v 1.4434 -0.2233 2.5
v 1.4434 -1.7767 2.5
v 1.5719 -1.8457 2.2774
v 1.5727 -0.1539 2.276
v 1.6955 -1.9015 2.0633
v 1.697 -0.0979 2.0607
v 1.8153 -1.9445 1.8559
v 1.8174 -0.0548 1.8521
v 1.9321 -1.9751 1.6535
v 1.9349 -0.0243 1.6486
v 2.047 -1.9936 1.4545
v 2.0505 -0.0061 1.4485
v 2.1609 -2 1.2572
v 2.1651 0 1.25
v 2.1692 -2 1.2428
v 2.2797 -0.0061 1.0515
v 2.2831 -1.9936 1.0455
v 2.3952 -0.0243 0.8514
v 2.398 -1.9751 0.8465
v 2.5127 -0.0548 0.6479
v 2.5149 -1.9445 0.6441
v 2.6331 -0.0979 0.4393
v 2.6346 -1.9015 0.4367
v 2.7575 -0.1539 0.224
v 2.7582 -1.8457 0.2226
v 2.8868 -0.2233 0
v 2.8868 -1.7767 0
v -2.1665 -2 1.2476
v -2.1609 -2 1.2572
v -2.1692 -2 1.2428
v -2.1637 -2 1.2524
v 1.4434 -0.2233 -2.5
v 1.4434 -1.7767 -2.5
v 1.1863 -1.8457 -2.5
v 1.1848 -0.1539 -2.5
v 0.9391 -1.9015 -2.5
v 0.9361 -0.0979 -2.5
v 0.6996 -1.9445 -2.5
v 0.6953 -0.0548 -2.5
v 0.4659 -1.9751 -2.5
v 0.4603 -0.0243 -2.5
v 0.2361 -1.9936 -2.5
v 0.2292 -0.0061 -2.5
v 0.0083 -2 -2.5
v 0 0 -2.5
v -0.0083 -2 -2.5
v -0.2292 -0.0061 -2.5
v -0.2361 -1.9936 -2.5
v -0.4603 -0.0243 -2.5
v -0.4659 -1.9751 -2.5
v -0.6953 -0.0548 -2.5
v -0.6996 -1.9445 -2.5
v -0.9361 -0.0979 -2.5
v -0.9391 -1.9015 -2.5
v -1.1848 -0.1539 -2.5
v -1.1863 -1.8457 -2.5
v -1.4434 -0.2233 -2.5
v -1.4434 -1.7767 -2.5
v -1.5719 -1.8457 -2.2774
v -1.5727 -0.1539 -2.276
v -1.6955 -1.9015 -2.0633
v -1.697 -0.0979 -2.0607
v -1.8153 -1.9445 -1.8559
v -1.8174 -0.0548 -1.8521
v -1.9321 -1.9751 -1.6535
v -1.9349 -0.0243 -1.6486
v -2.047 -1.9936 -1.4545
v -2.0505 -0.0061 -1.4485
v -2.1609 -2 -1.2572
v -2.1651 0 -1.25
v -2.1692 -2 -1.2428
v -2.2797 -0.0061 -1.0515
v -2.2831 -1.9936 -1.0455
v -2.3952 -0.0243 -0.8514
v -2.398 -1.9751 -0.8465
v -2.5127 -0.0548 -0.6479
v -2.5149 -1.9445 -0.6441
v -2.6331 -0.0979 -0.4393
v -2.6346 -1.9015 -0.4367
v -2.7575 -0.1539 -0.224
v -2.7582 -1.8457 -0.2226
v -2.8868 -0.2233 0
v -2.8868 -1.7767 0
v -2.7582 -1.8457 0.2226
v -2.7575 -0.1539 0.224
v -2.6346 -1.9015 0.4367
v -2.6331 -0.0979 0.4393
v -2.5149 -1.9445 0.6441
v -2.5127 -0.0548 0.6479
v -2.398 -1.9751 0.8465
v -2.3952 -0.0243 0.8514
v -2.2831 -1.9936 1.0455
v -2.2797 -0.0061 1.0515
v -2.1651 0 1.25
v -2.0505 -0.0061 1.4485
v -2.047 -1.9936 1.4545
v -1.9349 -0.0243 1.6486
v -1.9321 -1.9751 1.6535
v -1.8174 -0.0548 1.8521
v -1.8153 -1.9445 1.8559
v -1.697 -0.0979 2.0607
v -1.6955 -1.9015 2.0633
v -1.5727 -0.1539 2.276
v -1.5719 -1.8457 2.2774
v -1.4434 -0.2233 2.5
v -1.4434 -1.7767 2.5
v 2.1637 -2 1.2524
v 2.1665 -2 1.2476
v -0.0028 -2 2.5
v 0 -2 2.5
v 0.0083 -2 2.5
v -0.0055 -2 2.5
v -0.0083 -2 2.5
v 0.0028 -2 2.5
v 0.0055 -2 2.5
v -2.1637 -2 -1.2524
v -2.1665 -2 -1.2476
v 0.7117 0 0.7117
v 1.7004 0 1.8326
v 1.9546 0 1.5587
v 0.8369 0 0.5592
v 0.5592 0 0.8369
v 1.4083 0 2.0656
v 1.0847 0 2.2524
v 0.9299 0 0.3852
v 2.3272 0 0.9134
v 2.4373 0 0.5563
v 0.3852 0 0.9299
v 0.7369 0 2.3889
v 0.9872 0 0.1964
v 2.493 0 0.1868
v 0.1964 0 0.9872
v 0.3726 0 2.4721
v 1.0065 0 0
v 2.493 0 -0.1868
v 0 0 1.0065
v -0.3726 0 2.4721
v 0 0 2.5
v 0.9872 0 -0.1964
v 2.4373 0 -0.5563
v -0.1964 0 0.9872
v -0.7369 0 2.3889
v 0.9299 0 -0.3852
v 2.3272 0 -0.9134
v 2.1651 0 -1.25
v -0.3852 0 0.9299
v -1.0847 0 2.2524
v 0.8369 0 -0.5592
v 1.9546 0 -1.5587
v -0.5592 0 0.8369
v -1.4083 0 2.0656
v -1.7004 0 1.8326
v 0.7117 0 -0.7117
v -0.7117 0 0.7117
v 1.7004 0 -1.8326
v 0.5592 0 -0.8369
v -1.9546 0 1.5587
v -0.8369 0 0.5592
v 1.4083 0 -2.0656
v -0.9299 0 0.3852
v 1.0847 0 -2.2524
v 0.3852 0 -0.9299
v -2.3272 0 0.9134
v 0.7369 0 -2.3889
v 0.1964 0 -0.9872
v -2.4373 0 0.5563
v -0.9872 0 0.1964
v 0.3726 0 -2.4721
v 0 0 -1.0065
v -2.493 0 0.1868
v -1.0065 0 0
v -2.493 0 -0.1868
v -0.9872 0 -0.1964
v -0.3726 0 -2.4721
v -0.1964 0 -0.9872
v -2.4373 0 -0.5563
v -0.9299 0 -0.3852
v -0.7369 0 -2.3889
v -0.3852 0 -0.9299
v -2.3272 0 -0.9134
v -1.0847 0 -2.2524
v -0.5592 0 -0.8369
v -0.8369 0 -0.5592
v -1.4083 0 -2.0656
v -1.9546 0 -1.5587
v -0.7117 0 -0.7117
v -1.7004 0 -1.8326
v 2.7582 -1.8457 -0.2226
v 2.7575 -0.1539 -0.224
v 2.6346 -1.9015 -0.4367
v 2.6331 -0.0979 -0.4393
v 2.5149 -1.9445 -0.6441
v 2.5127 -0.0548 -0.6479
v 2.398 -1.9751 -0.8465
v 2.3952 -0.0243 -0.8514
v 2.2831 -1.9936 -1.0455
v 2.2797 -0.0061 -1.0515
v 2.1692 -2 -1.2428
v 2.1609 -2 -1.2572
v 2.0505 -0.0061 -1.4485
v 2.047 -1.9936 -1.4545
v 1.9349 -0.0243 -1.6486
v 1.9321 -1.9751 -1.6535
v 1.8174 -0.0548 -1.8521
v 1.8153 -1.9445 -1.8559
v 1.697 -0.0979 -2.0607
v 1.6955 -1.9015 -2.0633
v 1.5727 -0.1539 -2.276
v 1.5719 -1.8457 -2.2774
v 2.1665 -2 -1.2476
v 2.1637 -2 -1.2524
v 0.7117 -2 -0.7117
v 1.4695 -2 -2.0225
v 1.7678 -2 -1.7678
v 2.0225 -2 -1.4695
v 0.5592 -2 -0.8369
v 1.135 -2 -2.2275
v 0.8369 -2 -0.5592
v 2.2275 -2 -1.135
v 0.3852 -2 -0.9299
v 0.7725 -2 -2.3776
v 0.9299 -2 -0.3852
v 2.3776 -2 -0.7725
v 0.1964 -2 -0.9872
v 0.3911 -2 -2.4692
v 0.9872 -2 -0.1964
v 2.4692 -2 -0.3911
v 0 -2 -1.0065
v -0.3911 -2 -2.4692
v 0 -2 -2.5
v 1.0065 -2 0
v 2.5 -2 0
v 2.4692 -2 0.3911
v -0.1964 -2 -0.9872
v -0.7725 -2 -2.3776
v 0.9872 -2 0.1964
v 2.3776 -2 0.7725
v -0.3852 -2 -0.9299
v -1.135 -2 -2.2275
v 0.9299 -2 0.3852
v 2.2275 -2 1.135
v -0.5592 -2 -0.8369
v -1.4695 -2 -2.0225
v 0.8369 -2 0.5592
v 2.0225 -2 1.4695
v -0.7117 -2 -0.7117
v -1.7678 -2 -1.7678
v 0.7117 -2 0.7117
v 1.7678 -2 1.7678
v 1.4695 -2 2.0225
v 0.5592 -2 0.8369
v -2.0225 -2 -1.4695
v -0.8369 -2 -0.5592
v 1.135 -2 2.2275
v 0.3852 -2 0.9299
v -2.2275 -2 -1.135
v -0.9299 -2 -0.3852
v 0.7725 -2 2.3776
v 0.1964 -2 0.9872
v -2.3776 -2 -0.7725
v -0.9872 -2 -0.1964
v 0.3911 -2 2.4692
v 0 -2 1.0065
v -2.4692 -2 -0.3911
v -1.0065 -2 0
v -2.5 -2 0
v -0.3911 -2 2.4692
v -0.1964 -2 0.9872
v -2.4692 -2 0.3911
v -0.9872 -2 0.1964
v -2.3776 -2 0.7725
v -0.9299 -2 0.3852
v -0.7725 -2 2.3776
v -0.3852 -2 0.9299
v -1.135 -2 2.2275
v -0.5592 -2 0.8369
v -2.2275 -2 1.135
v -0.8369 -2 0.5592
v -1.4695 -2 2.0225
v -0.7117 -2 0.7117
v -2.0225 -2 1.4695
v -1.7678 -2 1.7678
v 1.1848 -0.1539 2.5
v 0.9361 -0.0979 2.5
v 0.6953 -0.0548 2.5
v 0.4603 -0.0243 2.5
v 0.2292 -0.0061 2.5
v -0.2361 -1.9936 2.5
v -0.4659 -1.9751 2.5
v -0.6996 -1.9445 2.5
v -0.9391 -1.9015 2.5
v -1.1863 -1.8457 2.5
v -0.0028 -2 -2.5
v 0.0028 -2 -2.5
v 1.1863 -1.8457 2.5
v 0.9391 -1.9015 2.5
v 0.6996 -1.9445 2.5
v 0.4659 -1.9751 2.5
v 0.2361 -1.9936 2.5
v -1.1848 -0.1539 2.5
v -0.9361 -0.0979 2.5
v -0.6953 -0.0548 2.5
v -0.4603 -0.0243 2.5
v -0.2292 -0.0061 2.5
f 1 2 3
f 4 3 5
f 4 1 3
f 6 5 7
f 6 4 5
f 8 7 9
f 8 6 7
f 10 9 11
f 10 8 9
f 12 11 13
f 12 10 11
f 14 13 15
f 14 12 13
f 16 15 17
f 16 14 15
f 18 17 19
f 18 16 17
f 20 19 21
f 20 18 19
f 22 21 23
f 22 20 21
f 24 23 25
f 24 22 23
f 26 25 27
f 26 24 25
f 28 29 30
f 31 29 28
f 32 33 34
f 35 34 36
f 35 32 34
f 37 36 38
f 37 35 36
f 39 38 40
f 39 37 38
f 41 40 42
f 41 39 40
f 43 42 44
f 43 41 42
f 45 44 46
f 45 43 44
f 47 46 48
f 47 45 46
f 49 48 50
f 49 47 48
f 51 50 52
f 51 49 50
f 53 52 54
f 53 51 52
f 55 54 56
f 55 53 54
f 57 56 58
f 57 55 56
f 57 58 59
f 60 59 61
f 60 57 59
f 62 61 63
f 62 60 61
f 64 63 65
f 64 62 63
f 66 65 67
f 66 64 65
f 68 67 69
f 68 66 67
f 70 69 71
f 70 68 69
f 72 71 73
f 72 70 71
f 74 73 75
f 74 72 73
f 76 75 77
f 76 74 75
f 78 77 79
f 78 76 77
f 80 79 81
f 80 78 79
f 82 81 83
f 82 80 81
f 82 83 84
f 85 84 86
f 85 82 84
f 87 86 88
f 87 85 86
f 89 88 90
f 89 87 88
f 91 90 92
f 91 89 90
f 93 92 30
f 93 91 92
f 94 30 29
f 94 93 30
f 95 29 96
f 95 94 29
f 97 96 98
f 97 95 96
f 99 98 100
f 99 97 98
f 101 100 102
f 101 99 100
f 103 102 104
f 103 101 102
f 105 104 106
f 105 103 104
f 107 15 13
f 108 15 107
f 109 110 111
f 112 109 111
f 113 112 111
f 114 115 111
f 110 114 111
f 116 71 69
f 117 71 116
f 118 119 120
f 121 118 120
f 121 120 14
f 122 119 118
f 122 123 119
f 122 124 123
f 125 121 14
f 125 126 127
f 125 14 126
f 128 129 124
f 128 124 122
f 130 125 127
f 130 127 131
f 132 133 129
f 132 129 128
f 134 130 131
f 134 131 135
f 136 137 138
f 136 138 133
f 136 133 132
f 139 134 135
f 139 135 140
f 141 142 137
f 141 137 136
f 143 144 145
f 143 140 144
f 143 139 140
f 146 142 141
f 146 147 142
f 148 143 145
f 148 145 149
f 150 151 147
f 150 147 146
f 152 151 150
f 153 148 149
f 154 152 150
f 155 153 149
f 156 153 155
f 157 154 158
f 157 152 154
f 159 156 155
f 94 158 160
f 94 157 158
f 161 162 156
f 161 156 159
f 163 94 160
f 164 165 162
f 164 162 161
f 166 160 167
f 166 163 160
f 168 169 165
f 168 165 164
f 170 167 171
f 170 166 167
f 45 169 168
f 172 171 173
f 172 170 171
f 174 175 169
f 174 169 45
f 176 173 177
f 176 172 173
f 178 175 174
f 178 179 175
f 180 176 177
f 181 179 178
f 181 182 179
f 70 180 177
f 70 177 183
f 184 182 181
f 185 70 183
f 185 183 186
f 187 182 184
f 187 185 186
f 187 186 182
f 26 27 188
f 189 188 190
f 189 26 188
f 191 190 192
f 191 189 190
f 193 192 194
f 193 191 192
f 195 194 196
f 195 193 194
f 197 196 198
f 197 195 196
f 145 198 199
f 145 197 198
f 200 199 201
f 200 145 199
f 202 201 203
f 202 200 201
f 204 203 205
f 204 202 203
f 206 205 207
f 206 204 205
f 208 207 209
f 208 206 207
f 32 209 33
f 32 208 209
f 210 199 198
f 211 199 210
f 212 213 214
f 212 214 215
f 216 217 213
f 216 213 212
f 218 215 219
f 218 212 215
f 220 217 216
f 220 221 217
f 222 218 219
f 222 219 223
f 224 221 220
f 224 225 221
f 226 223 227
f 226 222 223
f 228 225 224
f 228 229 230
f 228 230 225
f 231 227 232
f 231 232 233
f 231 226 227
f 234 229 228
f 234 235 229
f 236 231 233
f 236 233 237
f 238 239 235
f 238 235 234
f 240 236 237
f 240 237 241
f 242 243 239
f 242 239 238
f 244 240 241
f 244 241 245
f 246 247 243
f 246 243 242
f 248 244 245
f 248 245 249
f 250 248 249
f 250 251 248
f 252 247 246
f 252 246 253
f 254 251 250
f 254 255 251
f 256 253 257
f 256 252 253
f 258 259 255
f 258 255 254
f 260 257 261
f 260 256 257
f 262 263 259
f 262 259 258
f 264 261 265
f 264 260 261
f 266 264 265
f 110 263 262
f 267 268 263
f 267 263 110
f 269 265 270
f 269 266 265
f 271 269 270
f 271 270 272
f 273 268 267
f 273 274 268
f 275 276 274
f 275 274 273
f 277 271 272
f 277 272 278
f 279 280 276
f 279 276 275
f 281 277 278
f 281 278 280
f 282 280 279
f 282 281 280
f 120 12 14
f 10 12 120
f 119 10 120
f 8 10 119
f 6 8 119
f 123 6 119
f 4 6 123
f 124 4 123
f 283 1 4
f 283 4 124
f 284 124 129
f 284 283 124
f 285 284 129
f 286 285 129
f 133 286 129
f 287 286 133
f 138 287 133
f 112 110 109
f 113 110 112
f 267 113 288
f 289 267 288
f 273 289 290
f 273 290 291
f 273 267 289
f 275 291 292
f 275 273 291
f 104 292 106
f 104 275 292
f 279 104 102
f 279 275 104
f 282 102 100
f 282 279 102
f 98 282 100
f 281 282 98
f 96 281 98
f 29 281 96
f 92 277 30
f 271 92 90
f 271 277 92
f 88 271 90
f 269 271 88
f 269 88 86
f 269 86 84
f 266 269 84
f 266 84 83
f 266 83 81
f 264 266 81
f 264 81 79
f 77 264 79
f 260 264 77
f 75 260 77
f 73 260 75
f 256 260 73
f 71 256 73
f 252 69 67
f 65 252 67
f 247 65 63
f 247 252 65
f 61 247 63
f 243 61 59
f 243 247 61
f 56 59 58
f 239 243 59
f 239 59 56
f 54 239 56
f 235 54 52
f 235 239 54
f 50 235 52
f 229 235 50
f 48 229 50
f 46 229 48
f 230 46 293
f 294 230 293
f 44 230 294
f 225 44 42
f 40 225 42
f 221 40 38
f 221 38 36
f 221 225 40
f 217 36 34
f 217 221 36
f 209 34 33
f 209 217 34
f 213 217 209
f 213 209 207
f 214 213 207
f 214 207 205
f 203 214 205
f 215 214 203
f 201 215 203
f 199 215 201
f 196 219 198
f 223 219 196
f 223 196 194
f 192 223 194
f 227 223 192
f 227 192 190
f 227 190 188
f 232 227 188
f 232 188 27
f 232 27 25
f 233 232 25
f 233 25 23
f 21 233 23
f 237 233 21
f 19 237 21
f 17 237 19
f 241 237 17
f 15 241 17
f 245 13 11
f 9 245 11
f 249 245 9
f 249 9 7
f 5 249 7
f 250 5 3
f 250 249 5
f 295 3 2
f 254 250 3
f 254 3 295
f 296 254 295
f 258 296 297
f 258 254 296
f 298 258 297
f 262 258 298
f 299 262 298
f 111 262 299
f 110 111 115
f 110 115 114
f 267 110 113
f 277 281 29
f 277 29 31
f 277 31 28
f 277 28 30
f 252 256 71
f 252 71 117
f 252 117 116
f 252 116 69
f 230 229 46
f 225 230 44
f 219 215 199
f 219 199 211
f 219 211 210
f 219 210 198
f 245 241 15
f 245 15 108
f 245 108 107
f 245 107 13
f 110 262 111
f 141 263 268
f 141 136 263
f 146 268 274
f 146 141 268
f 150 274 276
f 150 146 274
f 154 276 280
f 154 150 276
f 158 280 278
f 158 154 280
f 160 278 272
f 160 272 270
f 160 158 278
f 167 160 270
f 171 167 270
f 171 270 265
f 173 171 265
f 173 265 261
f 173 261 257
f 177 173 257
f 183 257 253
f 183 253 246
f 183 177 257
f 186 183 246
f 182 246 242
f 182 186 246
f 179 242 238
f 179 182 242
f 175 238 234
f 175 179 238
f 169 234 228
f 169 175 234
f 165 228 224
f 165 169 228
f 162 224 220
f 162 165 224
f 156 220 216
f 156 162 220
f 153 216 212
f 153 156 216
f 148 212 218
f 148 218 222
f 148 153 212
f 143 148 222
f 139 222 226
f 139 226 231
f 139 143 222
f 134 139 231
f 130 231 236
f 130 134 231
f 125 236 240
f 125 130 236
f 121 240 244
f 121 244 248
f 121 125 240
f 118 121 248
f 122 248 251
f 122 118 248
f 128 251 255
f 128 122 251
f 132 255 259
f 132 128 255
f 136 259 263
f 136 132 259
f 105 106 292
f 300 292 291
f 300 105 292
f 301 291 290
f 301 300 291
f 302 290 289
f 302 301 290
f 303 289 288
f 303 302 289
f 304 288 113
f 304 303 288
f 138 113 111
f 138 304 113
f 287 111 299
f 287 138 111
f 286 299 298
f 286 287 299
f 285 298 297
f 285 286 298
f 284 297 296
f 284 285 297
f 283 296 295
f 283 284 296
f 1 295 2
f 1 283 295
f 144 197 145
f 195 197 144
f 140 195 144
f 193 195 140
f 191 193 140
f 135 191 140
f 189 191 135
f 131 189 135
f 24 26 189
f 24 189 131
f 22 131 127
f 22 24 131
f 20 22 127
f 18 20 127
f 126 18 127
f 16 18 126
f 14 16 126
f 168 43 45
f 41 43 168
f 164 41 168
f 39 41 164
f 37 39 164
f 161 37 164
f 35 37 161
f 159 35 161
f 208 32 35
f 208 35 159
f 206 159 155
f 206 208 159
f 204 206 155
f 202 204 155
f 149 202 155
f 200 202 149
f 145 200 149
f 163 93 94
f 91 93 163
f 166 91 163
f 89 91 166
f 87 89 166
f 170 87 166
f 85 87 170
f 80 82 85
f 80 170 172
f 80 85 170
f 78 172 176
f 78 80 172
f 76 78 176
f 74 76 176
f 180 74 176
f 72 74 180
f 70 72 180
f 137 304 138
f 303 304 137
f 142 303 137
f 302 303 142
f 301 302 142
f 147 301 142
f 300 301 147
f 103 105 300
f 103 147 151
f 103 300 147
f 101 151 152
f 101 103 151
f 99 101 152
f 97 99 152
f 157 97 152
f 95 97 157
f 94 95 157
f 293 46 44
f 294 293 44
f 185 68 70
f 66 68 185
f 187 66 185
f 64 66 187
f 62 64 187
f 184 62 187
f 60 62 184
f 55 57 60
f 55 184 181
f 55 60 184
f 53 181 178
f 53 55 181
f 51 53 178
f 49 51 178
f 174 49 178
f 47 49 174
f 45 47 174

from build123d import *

# Parameters (mm, degrees)
SCHNITT_LINEAR_START            = -1e-07
SCHNITT_LINEAR_AUSTRAGEN1_DEPTH = 1.999992134


# Read off the part's stored shape, not the designer's step: Schnitt-Linear austragen1
with BuildPart() as part:
    # Skizze1 → Basis-Rotation (revolve)
    with BuildSketch(Plane.XY, mode=Mode.PRIVATE) as basis_rotation_sk:
        Polygon((1.0065, 0), (2.5, 0), (2.886751346, -0.223290994), (2.886751346, -1.776709006), (2.5, -2), (1.0065, -2), align=None)
    revolve(basis_rotation_sk.sketch.rotate(Axis((0, 0, 0), (0, -1, 0)), 90), axis=Axis((0, 0, 0), (0, -1, 0)))

    # Schnitt-Linear austragen1 outline → Schnitt-Linear austragen1 (cut)
    with BuildSketch(Plane.XZ.offset(SCHNITT_LINEAR_START)):
        with BuildLine():
            ThreePointArc((-1.443375673, -2.5), (0, -2.886751346), (1.443375673, -2.5))
            Line((1.443375673, -2.5), (-1.443375673, -2.5))
        make_face()
        with BuildLine():
            Line((2.886751346, 0), (1.443375673, -2.5))
            ThreePointArc((1.443375673, -2.5), (2.5, -1.443375673), (2.886751346, 0))
        make_face()
        with BuildLine():
            ThreePointArc((-2.886751346, 0), (-2.5, -1.443375673), (-1.443375673, -2.5))
            Line((-1.443375673, -2.5), (-2.886751346, 0))
        make_face()
        with BuildLine():
            Line((1.443375673, 2.5), (2.886751346, 0))
            ThreePointArc((2.886751346, 0), (2.5, 1.443375673), (1.443375673, 2.5))
        make_face()
        with BuildLine():
            ThreePointArc((-1.443375673, 2.5), (-2.5, 1.443375673), (-2.886751346, 0))
            Line((-2.886751346, 0), (-1.443375673, 2.5))
        make_face()
        with BuildLine():
            Line((-1.443375673, 2.5), (1.443375673, 2.5))
            ThreePointArc((1.443375673, 2.5), (0, 2.886751346), (-1.443375673, 2.5))
        make_face()
    extrude(amount=SCHNITT_LINEAR_AUSTRAGEN1_DEPTH, mode=Mode.SUBTRACT)


solid = part.part
